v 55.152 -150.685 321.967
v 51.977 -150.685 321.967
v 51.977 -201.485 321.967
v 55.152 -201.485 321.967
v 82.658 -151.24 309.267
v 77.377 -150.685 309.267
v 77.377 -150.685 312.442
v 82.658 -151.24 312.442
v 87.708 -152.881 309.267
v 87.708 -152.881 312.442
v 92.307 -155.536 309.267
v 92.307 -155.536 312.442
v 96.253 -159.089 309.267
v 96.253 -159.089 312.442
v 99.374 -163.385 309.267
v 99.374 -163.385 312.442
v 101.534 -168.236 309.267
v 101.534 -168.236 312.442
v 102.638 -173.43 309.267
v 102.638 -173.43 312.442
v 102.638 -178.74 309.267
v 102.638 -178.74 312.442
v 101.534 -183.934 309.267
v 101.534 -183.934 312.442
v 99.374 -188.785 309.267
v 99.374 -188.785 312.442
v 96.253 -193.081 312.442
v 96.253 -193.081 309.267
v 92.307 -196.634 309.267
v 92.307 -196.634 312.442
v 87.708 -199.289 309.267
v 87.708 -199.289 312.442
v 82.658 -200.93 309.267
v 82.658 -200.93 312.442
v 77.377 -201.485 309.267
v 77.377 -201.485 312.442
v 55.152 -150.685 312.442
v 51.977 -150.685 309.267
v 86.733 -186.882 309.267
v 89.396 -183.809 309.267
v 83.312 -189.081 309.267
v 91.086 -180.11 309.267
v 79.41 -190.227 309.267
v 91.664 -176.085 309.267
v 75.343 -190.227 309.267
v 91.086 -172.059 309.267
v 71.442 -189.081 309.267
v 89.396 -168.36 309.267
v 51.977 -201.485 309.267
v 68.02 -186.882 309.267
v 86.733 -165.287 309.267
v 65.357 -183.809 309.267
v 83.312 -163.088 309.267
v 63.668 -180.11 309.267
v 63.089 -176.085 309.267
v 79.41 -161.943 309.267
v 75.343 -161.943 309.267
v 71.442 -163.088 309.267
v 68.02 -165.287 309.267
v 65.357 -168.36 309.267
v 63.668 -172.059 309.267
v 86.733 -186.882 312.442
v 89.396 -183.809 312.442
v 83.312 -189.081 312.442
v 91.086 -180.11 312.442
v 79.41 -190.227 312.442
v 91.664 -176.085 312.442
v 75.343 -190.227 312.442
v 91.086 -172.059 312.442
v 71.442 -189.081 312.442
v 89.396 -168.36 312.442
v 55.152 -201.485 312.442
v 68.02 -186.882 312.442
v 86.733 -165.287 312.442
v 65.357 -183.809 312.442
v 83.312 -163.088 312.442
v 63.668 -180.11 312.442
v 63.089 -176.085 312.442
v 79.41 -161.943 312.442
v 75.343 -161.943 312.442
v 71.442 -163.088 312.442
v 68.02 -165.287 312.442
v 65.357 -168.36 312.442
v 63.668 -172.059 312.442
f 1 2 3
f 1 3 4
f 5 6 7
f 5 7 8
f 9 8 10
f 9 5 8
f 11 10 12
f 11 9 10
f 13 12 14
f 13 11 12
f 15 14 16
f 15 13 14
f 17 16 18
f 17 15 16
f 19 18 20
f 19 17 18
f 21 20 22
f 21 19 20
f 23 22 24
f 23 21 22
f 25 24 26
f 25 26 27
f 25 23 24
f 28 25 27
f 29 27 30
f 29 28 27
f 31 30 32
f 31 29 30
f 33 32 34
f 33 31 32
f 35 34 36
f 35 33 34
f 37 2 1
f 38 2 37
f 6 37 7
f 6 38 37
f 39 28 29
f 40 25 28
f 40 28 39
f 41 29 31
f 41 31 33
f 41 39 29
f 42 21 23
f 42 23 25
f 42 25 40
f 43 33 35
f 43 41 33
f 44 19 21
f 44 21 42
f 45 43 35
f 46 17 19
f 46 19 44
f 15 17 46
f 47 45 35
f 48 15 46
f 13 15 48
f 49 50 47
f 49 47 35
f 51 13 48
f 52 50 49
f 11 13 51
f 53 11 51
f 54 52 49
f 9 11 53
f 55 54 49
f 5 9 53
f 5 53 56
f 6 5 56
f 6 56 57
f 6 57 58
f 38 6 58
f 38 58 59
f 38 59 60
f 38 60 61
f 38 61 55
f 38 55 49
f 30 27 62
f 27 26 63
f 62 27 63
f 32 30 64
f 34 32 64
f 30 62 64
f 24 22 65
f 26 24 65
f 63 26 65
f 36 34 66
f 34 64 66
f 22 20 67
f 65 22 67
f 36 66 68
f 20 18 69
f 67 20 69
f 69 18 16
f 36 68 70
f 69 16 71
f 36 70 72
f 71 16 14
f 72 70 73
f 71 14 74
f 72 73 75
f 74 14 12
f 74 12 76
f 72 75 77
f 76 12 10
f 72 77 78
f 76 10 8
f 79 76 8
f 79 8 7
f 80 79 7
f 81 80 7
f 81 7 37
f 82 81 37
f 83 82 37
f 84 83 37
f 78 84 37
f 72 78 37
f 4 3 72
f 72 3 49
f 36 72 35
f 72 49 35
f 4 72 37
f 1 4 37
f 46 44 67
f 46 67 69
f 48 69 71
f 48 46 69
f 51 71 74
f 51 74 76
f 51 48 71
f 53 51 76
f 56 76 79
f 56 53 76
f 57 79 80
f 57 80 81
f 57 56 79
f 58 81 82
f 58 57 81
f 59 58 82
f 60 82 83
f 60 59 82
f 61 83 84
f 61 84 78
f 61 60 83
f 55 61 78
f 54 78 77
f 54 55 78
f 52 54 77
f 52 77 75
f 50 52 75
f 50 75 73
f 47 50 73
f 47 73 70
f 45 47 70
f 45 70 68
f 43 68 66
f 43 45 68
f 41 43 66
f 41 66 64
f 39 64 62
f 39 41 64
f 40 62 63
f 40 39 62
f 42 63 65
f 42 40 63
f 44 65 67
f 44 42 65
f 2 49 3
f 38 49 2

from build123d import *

# Parameters (mm, degrees)
SKETCH1_R           = 14.2875
BOSS_EXTRUDE1_DEPTH = 3.175
SKETCH2_W           = 3.175
SKETCH2_H           = 50.8
BOSS_EXTRUDE2_DEPTH = 9.525


with BuildPart() as part:
    # Sketch1 → Boss-Extrude1 (new body)
    with BuildSketch(Plane.XY.offset(309.267180797)):
        with BuildLine():
            Line((51.976784349, -201.484673508), (51.976784349, -150.684673508))
            Line((51.976784349, -150.684673508), (77.376784349, -150.684673508))
            ThreePointArc((77.376784349, -150.684673508), (102.776784349, -176.084673508), (77.376784349, -201.484673508))
            Line((77.376784349, -201.484673508), (51.976784349, -201.484673508))
        make_face()
        with Locations((77.376784349, -176.084673508)):
            Circle(SKETCH1_R, mode=Mode.SUBTRACT)
    extrude(amount=BOSS_EXTRUDE1_DEPTH)

    # Sketch2 → Boss-Extrude2 (add)
    with BuildSketch(Plane.XY.offset(312.442180797)):
        with Locations((53.564284349, -176.084673508)):
            Rectangle(SKETCH2_W, SKETCH2_H)
    extrude(amount=BOSS_EXTRUDE2_DEPTH)


solid = part.part
